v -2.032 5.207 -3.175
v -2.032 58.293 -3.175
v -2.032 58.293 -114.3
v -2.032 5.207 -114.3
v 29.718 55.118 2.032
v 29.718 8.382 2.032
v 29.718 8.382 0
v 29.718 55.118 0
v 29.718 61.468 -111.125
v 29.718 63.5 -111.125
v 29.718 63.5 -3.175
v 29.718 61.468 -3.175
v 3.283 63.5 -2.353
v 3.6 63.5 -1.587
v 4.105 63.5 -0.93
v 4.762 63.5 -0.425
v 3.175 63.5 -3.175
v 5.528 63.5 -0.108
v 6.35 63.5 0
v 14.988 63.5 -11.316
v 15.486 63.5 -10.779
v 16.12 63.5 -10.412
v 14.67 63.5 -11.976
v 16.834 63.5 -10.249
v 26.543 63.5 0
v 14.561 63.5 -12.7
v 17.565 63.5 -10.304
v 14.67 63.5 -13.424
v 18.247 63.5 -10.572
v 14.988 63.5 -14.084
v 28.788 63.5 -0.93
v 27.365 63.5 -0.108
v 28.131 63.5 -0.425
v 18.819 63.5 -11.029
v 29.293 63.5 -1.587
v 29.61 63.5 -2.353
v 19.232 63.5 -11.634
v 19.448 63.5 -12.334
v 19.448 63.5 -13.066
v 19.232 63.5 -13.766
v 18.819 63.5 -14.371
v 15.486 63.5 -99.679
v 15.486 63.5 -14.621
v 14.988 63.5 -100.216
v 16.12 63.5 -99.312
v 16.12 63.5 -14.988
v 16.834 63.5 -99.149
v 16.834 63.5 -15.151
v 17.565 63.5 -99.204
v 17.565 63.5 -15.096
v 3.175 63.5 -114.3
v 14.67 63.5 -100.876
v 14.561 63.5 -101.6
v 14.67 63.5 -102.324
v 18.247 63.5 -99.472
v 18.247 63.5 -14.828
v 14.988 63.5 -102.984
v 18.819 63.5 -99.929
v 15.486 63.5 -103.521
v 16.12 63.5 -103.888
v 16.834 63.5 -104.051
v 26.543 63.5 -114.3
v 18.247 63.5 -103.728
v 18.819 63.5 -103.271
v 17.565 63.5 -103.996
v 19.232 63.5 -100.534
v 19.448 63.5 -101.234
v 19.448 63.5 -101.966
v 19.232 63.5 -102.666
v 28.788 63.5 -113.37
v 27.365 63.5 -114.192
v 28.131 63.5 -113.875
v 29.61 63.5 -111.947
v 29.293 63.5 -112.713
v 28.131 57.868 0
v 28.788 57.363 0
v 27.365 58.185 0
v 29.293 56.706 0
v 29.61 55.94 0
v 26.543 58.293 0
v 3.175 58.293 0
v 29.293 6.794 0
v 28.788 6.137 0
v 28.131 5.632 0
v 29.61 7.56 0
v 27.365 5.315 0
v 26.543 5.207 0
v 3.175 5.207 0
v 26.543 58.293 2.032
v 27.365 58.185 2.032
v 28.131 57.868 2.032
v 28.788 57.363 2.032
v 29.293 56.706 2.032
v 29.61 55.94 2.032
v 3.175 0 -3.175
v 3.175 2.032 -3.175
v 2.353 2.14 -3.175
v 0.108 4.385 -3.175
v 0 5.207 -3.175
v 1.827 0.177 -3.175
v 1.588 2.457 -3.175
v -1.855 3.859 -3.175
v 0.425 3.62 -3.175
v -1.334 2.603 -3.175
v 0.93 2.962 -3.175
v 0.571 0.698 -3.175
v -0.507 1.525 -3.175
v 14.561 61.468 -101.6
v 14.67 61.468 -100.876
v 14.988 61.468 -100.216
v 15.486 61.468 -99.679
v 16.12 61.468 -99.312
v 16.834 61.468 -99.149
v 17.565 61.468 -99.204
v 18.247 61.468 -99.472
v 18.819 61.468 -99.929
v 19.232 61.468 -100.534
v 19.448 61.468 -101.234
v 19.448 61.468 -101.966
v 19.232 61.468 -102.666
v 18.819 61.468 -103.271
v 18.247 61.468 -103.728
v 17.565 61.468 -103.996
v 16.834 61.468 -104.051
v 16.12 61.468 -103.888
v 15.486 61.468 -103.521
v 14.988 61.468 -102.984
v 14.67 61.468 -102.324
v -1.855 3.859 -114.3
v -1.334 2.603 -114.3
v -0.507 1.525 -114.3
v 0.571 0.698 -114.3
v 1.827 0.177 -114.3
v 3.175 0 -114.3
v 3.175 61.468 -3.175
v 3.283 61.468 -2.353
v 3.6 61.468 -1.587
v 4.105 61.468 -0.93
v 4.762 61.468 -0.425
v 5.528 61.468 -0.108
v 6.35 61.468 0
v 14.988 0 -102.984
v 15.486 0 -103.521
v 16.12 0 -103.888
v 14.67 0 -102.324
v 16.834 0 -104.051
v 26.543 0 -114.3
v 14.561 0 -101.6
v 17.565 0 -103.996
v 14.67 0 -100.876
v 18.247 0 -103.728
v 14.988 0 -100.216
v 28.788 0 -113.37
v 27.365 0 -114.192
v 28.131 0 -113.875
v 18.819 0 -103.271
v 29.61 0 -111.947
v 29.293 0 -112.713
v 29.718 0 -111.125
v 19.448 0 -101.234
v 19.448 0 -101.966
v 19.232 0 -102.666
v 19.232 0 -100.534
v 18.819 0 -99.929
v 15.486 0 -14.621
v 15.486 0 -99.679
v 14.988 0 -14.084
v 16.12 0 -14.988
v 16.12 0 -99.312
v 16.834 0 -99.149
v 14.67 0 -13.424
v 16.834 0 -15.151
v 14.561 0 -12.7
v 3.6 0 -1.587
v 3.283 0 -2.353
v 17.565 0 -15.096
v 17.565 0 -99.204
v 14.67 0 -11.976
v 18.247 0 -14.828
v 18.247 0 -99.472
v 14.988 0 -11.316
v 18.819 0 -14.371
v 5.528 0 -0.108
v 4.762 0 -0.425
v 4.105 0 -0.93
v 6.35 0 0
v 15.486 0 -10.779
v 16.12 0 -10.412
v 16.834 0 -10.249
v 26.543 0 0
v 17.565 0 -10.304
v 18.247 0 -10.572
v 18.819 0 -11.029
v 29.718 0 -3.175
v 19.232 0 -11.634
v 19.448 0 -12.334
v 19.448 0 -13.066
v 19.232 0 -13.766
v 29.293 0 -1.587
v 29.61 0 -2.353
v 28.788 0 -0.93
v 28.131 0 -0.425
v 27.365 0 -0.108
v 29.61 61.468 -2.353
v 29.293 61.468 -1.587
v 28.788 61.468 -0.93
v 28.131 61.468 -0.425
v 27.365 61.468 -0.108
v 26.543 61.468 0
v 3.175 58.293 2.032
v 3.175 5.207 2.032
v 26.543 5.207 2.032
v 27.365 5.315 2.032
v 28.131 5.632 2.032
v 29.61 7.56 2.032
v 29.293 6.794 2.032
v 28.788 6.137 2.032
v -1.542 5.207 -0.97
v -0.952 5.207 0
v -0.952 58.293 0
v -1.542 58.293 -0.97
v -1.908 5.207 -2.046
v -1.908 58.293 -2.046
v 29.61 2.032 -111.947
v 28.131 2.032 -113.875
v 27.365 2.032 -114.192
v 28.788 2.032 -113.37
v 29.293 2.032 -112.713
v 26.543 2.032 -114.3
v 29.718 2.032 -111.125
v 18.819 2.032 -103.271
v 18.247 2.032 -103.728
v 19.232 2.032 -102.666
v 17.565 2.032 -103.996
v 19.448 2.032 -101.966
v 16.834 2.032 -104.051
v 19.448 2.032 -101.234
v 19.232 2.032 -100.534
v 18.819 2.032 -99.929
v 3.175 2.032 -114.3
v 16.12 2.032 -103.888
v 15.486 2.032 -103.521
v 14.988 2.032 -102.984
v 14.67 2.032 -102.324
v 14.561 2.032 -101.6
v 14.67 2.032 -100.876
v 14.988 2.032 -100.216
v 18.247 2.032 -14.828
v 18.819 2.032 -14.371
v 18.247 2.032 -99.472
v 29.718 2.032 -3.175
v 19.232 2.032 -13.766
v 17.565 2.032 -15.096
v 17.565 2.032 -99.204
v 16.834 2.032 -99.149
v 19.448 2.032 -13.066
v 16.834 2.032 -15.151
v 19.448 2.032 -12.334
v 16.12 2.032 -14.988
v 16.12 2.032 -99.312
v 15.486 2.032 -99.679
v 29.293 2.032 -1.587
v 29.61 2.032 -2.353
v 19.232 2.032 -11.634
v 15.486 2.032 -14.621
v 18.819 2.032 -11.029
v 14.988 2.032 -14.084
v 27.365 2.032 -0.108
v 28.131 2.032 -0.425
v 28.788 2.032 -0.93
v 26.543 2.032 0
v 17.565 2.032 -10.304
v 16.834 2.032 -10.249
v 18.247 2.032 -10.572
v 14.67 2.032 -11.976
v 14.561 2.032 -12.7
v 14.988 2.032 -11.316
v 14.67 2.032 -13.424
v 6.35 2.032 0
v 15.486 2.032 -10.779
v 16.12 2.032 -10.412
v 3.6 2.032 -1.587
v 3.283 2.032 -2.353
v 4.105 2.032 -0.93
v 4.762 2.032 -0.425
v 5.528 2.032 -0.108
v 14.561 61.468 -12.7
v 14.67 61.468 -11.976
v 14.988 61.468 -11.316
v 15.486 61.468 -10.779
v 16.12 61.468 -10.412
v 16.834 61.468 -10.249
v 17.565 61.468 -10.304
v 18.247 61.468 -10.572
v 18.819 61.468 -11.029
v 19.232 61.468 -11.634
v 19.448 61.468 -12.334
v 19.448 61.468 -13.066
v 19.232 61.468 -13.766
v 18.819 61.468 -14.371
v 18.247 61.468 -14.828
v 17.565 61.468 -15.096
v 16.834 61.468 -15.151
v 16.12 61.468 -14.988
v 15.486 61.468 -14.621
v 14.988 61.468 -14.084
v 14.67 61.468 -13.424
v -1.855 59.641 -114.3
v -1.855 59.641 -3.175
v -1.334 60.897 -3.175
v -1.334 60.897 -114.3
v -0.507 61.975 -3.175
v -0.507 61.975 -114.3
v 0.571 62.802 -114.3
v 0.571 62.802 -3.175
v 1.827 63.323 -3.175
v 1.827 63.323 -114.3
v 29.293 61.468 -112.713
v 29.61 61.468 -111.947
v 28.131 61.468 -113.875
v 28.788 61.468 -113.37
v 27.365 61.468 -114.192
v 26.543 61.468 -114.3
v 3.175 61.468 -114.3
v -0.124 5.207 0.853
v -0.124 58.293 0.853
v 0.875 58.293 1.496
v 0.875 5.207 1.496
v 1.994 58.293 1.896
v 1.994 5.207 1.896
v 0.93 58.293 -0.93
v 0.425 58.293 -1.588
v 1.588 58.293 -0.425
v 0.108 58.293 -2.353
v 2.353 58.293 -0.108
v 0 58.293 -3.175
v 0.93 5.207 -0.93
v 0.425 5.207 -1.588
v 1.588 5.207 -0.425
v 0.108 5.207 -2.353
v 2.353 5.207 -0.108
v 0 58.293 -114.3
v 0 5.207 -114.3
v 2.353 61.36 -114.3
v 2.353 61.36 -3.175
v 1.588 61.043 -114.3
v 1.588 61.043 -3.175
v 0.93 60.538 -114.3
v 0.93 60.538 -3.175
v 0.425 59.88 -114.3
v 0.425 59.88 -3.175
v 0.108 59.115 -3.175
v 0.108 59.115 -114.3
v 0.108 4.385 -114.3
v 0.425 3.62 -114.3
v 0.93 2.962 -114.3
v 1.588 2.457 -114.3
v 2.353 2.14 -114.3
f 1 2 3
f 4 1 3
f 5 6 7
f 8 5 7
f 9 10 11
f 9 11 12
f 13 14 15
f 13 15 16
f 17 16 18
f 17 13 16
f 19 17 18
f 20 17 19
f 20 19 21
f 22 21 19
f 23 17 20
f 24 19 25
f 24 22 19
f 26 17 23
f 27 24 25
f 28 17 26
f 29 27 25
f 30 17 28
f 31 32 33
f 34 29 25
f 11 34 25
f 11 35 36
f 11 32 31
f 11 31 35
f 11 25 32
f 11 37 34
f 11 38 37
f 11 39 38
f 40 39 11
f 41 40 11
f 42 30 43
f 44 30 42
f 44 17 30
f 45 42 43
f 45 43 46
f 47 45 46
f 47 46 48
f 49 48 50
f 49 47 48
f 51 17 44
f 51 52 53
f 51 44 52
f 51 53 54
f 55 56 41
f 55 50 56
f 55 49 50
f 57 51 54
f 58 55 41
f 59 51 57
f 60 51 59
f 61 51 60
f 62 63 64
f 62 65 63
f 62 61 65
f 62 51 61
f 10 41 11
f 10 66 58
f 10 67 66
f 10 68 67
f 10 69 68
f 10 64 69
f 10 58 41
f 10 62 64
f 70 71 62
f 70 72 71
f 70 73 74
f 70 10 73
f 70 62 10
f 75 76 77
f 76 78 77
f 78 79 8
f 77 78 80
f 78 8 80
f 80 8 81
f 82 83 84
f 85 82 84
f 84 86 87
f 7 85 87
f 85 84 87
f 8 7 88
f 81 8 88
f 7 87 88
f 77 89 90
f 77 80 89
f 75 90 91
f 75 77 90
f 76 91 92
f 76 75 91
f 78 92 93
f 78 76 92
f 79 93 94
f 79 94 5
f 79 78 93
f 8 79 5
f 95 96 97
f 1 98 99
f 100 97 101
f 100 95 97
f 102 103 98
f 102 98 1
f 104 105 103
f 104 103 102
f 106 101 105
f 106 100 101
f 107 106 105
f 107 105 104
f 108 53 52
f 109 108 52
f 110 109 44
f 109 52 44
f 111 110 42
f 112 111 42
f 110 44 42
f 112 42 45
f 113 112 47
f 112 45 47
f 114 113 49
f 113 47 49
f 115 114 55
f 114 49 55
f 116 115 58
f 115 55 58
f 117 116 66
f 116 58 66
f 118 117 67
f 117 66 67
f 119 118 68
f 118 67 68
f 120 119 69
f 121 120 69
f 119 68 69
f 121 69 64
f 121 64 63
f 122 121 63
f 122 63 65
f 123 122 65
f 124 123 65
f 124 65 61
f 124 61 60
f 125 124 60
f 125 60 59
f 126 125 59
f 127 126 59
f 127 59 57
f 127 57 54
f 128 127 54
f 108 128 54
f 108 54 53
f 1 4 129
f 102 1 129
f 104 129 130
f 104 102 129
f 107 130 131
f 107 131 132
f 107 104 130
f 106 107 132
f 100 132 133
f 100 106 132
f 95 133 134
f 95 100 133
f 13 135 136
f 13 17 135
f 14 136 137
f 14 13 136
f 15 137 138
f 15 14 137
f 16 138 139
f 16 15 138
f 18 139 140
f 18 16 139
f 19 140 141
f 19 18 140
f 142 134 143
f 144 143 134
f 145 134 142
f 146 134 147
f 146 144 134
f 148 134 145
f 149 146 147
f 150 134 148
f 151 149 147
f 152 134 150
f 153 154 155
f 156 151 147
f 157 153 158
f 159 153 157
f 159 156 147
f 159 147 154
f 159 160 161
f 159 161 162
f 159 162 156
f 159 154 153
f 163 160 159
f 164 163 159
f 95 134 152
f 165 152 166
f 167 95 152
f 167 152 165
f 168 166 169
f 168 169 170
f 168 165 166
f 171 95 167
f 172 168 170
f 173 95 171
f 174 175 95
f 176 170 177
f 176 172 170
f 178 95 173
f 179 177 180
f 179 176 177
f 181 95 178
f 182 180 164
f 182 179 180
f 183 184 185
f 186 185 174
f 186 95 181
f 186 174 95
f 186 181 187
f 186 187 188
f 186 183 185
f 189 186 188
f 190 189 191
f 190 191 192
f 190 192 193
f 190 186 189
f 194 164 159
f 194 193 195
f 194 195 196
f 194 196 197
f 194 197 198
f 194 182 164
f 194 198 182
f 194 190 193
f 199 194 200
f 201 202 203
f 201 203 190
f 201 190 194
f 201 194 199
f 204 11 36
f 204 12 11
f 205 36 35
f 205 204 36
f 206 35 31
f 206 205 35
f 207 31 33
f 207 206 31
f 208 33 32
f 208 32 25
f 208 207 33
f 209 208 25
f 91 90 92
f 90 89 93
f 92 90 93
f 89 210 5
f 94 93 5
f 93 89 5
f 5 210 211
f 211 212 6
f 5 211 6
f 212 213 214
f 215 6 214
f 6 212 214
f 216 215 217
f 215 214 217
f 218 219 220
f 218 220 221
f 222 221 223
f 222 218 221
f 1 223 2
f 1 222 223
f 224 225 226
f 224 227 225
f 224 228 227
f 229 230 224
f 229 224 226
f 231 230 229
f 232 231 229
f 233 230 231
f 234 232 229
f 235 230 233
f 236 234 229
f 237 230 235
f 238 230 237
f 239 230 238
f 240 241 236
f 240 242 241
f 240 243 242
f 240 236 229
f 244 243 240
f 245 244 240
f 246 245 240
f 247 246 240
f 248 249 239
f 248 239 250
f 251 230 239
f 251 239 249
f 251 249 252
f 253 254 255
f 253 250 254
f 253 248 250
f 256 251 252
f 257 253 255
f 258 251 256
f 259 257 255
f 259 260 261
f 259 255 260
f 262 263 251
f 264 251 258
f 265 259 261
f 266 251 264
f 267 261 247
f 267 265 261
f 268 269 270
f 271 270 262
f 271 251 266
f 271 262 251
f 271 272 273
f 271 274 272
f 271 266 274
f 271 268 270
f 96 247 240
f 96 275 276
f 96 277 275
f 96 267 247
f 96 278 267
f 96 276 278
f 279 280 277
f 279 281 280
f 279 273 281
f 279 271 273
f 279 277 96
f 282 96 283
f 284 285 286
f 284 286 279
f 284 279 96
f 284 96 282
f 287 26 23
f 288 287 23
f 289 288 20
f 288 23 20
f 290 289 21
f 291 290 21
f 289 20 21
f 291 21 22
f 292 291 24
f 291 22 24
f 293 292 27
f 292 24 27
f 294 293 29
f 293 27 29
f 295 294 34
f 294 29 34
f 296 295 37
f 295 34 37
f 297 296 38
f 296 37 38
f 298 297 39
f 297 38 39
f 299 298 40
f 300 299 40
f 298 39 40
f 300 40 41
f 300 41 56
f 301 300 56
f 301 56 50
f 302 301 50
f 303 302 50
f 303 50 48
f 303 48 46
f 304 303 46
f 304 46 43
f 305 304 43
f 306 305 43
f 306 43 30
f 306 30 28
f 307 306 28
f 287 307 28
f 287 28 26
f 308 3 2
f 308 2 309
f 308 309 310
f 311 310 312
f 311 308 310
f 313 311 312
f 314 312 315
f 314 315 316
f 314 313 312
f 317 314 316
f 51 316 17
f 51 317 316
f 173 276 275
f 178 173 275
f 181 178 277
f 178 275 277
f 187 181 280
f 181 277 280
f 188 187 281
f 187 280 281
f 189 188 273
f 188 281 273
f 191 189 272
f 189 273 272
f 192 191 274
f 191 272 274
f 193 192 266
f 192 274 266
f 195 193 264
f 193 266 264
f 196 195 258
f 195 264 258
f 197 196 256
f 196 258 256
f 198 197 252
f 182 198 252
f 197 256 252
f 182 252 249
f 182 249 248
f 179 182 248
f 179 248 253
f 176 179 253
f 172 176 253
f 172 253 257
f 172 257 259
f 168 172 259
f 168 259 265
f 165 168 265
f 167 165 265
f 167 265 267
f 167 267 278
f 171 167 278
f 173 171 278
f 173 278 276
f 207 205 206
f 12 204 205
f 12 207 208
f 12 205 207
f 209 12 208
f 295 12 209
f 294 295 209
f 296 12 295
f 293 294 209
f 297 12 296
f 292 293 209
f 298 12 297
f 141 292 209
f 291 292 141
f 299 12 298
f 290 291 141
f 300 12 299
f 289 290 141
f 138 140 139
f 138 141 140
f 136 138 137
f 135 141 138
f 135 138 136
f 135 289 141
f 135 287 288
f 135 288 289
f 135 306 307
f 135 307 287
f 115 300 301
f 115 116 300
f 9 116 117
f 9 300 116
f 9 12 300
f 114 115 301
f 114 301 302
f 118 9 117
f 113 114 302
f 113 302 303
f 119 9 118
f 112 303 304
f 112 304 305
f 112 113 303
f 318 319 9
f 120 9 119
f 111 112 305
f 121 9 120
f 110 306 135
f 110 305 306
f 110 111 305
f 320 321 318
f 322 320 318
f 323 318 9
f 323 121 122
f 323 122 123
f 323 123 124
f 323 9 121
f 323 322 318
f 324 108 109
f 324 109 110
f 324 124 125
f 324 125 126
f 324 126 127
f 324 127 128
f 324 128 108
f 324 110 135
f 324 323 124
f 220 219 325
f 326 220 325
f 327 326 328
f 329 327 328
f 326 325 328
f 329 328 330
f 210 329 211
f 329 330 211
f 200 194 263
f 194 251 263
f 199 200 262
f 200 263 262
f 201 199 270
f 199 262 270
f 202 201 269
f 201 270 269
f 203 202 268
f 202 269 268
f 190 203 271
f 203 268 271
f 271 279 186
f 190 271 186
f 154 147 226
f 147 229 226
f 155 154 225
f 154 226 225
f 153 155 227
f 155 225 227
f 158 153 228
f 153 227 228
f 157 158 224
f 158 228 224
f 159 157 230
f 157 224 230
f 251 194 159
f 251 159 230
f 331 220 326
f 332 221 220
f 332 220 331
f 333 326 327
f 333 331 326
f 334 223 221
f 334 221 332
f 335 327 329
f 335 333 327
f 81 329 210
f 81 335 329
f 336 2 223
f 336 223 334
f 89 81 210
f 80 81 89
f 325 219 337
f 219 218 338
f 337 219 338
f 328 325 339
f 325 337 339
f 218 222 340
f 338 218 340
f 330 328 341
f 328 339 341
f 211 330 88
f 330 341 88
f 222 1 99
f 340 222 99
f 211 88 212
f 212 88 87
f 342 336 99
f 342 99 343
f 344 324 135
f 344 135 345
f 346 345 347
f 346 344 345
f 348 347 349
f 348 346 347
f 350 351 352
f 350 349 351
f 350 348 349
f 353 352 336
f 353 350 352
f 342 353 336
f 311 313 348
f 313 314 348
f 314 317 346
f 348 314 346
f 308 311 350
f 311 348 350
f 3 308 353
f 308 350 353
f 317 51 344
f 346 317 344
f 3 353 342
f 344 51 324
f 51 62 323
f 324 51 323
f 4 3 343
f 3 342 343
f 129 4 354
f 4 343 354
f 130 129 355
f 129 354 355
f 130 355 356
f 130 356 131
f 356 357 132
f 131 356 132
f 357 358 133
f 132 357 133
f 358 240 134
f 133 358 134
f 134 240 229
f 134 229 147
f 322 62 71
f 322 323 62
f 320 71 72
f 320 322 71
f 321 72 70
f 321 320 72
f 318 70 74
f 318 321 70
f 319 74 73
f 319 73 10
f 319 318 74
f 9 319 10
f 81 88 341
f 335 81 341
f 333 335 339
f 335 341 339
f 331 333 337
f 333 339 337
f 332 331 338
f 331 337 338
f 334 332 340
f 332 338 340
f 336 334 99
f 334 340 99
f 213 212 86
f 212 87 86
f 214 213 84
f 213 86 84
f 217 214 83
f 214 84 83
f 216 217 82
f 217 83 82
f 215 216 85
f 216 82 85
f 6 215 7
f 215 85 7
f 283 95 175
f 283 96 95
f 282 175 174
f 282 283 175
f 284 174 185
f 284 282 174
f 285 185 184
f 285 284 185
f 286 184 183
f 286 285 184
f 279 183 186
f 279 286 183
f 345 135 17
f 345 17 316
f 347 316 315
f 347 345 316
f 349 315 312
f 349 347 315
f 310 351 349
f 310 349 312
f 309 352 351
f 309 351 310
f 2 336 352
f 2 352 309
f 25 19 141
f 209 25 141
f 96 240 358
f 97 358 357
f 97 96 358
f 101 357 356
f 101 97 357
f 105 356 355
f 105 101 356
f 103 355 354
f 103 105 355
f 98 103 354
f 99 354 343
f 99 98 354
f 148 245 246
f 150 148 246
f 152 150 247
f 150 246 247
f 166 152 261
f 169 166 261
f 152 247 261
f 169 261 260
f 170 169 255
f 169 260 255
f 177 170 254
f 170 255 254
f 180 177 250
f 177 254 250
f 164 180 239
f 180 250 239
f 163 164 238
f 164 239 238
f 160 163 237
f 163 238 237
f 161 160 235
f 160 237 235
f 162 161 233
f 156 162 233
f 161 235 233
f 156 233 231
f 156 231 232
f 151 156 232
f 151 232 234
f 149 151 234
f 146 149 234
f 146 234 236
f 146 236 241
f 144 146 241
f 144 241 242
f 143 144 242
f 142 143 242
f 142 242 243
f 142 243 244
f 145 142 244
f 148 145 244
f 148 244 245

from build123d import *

# Parameters (mm, degrees)
SKETCH1_W                      = 114.3
SKETCH1_H                      = 63.5
BASE_FLANGE1_DEPTH             = 2.032
EDGE_FLANGE1_STRIP_W           = 14.478
EDGE_FLANGE1_STRIP_H           = 2.032
EDGE_FLANGE1_STRIP_CUT_DEPTH   = 114.3
EDGE_FLANGE1_STRIP_2_W         = 14.478
EDGE_FLANGE1_STRIP_2_H         = 2.032
EDGE_FLANGE1_STRIP_CUT_2_DEPTH = 114.3
EDGE_FLANGE1_DEPTH             = 114.3
EDGE_FLANGE1_BEND_DEPTH        = 114.3
EDGE_FLANGE2_DEPTH             = 63.5
EDGE_FLANGE2_2_DEPTH           = 5.207
EDGE_FLANGE2_START             = 58.293
EDGE_FLANGE2_3_DEPTH           = 5.207
EDGE_FLANGE2_START_2           = 5.207
EDGE_FLANGE2_4_DEPTH           = 53.086
SKETCH15_R                     = 2.45745
CUT_EXTRUDE1_DEPTH             = 135.089147674
FILLET1_R                      = 3.175


# Read off the part's stored shape, not the designer's step: Edge-Flange2
# Sheet-metal steps are written as plain solids
with BuildPart() as part:
    # Sketch1 → Base-Flange1 (new body)
    with BuildSketch(Plane(origin=(0, 0, 0), x_dir=(0, 0, -1), z_dir=(1, 0, 0))):
        with Locations((57.15, 31.75)):
            Rectangle(SKETCH1_W, SKETCH1_H)
    extrude(amount=-BASE_FLANGE1_DEPTH)

    # Edge-Flange1 strip (across the edge) → Edge-Flange1 strip cut (cut)
    with BuildSketch(Plane(origin=(0, 63.5, -114.3), x_dir=(0, -1, 0), z_dir=(0, 0, 1))):
        with Locations((-2.032, -1.016)):
            Rectangle(EDGE_FLANGE1_STRIP_W, EDGE_FLANGE1_STRIP_H)
    extrude(amount=EDGE_FLANGE1_STRIP_CUT_DEPTH, mode=Mode.SUBTRACT)

    # Edge-Flange1 strip 2 (across the edge) → Edge-Flange1 strip cut 2 (cut)
    with BuildSketch(Plane.YX):
        with Locations((-2.032, -1.016)):
            Rectangle(EDGE_FLANGE1_STRIP_2_W, EDGE_FLANGE1_STRIP_2_H)
    extrude(amount=EDGE_FLANGE1_STRIP_CUT_2_DEPTH, mode=Mode.SUBTRACT)

    # Edge-Flange1 section (across the edge) → Edge-Flange1 (add)
    with BuildSketch(Plane(origin=(0, 63.5, -114.3), x_dir=(0, -1, 0), z_dir=(0, 0, 1))):
        with BuildLine():
            Line((0, 3.175), (0, 29.718))
            Line((0, 29.718), (2.032, 29.718))
            Line((2.032, 29.718), (2.032, 3.175))
            ThreePointArc((2.032, 3.175), (2.96193597, 0.92993597), (5.207, 0))
            Line((5.207, 0), (5.207, -2.032))
            ThreePointArc((5.207, -2.032), (1.52509499, -0.50690501), (0, 3.175))
        make_face()
    extrude(amount=EDGE_FLANGE1_DEPTH)

    # Edge-Flange1 section 2 (across the edge) → Edge-Flange1 bend (add)
    with BuildSketch(Plane.YX):
        with BuildLine():
            Line((0, 3.175), (0, 29.718))
            Line((0, 29.718), (2.032, 29.718))
            Line((2.032, 29.718), (2.032, 3.175))
            ThreePointArc((2.032, 3.175), (2.96193597, 0.92993597), (5.207, 0))
            Line((5.207, 0), (5.207, -2.032))
            ThreePointArc((5.207, -2.032), (1.52509499, -0.50690501), (0, 3.175))
        make_face()
    extrude(amount=EDGE_FLANGE1_BEND_DEPTH)

    # Edge-Flange2 outline → Edge-Flange2 (cut)
    with BuildSketch(Plane(origin=(0, 0, 0), x_dir=(1, 0, 0), z_dir=(0, 1, 0))):
        with BuildLine():
            Line((3.175, 0), (3.175, 3.175))
            Line((3.175, 3.175), (0, 3.175))
            ThreePointArc((0, 3.175), (0.92993597, 0.92993597), (3.175, 0))
        make_face()
        with BuildLine():
            ThreePointArc((-0.95201151, 0), (-1.754614485, 1.498172628), (-2.032, 3.175))
            Line((-2.032, 3.175), (-2.032, 0))
            Line((-2.032, 0), (-0.95201151, 0))
        make_face()
    extrude(amount=EDGE_FLANGE2_DEPTH, mode=Mode.SUBTRACT)

    # Edge-Flange2 2 outline → Edge-Flange2 2 (cut)
    with BuildSketch(Plane(origin=(0, 0, 0), x_dir=(1, 0, 0), z_dir=(0, 1, 0))):
        with BuildLine():
            ThreePointArc((3.175, 0), (0.92993597, 0.92993597), (0, 3.175))
            Line((0, 3.175), (-2.032, 3.175))
            ThreePointArc((-2.032, 3.175), (-1.754614485, 1.498172628), (-0.95201151, 0))
            Line((-0.95201151, 0), (3.175, 0))
        make_face()
    extrude(amount=EDGE_FLANGE2_2_DEPTH, mode=Mode.SUBTRACT)

    # Edge-Flange2 3 outline → Edge-Flange2 3 (cut)
    with BuildSketch(Plane(origin=(0, 0, 0), x_dir=(1, 0, 0), z_dir=(0, 1, 0)).offset(EDGE_FLANGE2_START)):
        with BuildLine():
            ThreePointArc((3.175, 0), (0.92993597, 0.92993597), (0, 3.175))
            Line((0, 3.175), (-2.032, 3.175))
            ThreePointArc((-2.032, 3.175), (-1.754614485, 1.498172628), (-0.95201151, 0))
            Line((-0.95201151, 0), (3.175, 0))
        make_face()
    extrude(amount=EDGE_FLANGE2_3_DEPTH, mode=Mode.SUBTRACT)

    # Edge-Flange2 4 outline → Edge-Flange2 4 (add)
    with BuildSketch(Plane(origin=(0, 0, 0), x_dir=(1, 0, 0), z_dir=(0, 1, 0)).offset(EDGE_FLANGE2_START_2)):
        with BuildLine():
            Line((0, 3.175), (0, 0))
            Line((0, 0), (-0.95201151, 0))
            ThreePointArc((-0.95201151, 0), (0.874932175, -1.496459836), (3.175, -2.032))
            Line((3.175, -2.032), (29.718, -2.032))
            Line((29.718, -2.032), (29.718, 0))
            Line((29.718, 0), (3.175, 0))
            ThreePointArc((3.175, 0), (0.92993597, 0.92993597), (0, 3.175))
        make_face()
    extrude(amount=EDGE_FLANGE2_4_DEPTH)

    # Sketch15 → Cut-Extrude1 (cut, through all)
    with BuildSketch(Plane(origin=(0, 63.5, 0), x_dir=(1, 0, 0), z_dir=(0, 1, 0))):
        with Locations(Location((17.018, 101.6, 0), (0, 0, 180))):
            Circle(SKETCH15_R)
        with Locations(Location((17.018, 12.7, 0), (0, 0, 180))):
            Circle(SKETCH15_R)
    extrude(amount=-CUT_EXTRUDE1_DEPTH, mode=Mode.SUBTRACT)

    # Fillet1
    fillet1_edges = [part.edges().sort_by_distance(p)[0] for p in [
        (29.718, 1.016, -114.3),
        (29.718, 62.484, -114.3),
        (3.175, 1.016, 0),
        (29.718, 1.016, 0),
        (29.718, 5.207, 1.016),
        (29.718, 58.293, 1.016),
        (29.718, 62.484, 0),
        (3.175, 62.484, 0),
    ]]
    fillet(fillet1_edges, radius=FILLET1_R - 0.0001)  # a hair under: the kernel refuses the full size


solid = part.part
